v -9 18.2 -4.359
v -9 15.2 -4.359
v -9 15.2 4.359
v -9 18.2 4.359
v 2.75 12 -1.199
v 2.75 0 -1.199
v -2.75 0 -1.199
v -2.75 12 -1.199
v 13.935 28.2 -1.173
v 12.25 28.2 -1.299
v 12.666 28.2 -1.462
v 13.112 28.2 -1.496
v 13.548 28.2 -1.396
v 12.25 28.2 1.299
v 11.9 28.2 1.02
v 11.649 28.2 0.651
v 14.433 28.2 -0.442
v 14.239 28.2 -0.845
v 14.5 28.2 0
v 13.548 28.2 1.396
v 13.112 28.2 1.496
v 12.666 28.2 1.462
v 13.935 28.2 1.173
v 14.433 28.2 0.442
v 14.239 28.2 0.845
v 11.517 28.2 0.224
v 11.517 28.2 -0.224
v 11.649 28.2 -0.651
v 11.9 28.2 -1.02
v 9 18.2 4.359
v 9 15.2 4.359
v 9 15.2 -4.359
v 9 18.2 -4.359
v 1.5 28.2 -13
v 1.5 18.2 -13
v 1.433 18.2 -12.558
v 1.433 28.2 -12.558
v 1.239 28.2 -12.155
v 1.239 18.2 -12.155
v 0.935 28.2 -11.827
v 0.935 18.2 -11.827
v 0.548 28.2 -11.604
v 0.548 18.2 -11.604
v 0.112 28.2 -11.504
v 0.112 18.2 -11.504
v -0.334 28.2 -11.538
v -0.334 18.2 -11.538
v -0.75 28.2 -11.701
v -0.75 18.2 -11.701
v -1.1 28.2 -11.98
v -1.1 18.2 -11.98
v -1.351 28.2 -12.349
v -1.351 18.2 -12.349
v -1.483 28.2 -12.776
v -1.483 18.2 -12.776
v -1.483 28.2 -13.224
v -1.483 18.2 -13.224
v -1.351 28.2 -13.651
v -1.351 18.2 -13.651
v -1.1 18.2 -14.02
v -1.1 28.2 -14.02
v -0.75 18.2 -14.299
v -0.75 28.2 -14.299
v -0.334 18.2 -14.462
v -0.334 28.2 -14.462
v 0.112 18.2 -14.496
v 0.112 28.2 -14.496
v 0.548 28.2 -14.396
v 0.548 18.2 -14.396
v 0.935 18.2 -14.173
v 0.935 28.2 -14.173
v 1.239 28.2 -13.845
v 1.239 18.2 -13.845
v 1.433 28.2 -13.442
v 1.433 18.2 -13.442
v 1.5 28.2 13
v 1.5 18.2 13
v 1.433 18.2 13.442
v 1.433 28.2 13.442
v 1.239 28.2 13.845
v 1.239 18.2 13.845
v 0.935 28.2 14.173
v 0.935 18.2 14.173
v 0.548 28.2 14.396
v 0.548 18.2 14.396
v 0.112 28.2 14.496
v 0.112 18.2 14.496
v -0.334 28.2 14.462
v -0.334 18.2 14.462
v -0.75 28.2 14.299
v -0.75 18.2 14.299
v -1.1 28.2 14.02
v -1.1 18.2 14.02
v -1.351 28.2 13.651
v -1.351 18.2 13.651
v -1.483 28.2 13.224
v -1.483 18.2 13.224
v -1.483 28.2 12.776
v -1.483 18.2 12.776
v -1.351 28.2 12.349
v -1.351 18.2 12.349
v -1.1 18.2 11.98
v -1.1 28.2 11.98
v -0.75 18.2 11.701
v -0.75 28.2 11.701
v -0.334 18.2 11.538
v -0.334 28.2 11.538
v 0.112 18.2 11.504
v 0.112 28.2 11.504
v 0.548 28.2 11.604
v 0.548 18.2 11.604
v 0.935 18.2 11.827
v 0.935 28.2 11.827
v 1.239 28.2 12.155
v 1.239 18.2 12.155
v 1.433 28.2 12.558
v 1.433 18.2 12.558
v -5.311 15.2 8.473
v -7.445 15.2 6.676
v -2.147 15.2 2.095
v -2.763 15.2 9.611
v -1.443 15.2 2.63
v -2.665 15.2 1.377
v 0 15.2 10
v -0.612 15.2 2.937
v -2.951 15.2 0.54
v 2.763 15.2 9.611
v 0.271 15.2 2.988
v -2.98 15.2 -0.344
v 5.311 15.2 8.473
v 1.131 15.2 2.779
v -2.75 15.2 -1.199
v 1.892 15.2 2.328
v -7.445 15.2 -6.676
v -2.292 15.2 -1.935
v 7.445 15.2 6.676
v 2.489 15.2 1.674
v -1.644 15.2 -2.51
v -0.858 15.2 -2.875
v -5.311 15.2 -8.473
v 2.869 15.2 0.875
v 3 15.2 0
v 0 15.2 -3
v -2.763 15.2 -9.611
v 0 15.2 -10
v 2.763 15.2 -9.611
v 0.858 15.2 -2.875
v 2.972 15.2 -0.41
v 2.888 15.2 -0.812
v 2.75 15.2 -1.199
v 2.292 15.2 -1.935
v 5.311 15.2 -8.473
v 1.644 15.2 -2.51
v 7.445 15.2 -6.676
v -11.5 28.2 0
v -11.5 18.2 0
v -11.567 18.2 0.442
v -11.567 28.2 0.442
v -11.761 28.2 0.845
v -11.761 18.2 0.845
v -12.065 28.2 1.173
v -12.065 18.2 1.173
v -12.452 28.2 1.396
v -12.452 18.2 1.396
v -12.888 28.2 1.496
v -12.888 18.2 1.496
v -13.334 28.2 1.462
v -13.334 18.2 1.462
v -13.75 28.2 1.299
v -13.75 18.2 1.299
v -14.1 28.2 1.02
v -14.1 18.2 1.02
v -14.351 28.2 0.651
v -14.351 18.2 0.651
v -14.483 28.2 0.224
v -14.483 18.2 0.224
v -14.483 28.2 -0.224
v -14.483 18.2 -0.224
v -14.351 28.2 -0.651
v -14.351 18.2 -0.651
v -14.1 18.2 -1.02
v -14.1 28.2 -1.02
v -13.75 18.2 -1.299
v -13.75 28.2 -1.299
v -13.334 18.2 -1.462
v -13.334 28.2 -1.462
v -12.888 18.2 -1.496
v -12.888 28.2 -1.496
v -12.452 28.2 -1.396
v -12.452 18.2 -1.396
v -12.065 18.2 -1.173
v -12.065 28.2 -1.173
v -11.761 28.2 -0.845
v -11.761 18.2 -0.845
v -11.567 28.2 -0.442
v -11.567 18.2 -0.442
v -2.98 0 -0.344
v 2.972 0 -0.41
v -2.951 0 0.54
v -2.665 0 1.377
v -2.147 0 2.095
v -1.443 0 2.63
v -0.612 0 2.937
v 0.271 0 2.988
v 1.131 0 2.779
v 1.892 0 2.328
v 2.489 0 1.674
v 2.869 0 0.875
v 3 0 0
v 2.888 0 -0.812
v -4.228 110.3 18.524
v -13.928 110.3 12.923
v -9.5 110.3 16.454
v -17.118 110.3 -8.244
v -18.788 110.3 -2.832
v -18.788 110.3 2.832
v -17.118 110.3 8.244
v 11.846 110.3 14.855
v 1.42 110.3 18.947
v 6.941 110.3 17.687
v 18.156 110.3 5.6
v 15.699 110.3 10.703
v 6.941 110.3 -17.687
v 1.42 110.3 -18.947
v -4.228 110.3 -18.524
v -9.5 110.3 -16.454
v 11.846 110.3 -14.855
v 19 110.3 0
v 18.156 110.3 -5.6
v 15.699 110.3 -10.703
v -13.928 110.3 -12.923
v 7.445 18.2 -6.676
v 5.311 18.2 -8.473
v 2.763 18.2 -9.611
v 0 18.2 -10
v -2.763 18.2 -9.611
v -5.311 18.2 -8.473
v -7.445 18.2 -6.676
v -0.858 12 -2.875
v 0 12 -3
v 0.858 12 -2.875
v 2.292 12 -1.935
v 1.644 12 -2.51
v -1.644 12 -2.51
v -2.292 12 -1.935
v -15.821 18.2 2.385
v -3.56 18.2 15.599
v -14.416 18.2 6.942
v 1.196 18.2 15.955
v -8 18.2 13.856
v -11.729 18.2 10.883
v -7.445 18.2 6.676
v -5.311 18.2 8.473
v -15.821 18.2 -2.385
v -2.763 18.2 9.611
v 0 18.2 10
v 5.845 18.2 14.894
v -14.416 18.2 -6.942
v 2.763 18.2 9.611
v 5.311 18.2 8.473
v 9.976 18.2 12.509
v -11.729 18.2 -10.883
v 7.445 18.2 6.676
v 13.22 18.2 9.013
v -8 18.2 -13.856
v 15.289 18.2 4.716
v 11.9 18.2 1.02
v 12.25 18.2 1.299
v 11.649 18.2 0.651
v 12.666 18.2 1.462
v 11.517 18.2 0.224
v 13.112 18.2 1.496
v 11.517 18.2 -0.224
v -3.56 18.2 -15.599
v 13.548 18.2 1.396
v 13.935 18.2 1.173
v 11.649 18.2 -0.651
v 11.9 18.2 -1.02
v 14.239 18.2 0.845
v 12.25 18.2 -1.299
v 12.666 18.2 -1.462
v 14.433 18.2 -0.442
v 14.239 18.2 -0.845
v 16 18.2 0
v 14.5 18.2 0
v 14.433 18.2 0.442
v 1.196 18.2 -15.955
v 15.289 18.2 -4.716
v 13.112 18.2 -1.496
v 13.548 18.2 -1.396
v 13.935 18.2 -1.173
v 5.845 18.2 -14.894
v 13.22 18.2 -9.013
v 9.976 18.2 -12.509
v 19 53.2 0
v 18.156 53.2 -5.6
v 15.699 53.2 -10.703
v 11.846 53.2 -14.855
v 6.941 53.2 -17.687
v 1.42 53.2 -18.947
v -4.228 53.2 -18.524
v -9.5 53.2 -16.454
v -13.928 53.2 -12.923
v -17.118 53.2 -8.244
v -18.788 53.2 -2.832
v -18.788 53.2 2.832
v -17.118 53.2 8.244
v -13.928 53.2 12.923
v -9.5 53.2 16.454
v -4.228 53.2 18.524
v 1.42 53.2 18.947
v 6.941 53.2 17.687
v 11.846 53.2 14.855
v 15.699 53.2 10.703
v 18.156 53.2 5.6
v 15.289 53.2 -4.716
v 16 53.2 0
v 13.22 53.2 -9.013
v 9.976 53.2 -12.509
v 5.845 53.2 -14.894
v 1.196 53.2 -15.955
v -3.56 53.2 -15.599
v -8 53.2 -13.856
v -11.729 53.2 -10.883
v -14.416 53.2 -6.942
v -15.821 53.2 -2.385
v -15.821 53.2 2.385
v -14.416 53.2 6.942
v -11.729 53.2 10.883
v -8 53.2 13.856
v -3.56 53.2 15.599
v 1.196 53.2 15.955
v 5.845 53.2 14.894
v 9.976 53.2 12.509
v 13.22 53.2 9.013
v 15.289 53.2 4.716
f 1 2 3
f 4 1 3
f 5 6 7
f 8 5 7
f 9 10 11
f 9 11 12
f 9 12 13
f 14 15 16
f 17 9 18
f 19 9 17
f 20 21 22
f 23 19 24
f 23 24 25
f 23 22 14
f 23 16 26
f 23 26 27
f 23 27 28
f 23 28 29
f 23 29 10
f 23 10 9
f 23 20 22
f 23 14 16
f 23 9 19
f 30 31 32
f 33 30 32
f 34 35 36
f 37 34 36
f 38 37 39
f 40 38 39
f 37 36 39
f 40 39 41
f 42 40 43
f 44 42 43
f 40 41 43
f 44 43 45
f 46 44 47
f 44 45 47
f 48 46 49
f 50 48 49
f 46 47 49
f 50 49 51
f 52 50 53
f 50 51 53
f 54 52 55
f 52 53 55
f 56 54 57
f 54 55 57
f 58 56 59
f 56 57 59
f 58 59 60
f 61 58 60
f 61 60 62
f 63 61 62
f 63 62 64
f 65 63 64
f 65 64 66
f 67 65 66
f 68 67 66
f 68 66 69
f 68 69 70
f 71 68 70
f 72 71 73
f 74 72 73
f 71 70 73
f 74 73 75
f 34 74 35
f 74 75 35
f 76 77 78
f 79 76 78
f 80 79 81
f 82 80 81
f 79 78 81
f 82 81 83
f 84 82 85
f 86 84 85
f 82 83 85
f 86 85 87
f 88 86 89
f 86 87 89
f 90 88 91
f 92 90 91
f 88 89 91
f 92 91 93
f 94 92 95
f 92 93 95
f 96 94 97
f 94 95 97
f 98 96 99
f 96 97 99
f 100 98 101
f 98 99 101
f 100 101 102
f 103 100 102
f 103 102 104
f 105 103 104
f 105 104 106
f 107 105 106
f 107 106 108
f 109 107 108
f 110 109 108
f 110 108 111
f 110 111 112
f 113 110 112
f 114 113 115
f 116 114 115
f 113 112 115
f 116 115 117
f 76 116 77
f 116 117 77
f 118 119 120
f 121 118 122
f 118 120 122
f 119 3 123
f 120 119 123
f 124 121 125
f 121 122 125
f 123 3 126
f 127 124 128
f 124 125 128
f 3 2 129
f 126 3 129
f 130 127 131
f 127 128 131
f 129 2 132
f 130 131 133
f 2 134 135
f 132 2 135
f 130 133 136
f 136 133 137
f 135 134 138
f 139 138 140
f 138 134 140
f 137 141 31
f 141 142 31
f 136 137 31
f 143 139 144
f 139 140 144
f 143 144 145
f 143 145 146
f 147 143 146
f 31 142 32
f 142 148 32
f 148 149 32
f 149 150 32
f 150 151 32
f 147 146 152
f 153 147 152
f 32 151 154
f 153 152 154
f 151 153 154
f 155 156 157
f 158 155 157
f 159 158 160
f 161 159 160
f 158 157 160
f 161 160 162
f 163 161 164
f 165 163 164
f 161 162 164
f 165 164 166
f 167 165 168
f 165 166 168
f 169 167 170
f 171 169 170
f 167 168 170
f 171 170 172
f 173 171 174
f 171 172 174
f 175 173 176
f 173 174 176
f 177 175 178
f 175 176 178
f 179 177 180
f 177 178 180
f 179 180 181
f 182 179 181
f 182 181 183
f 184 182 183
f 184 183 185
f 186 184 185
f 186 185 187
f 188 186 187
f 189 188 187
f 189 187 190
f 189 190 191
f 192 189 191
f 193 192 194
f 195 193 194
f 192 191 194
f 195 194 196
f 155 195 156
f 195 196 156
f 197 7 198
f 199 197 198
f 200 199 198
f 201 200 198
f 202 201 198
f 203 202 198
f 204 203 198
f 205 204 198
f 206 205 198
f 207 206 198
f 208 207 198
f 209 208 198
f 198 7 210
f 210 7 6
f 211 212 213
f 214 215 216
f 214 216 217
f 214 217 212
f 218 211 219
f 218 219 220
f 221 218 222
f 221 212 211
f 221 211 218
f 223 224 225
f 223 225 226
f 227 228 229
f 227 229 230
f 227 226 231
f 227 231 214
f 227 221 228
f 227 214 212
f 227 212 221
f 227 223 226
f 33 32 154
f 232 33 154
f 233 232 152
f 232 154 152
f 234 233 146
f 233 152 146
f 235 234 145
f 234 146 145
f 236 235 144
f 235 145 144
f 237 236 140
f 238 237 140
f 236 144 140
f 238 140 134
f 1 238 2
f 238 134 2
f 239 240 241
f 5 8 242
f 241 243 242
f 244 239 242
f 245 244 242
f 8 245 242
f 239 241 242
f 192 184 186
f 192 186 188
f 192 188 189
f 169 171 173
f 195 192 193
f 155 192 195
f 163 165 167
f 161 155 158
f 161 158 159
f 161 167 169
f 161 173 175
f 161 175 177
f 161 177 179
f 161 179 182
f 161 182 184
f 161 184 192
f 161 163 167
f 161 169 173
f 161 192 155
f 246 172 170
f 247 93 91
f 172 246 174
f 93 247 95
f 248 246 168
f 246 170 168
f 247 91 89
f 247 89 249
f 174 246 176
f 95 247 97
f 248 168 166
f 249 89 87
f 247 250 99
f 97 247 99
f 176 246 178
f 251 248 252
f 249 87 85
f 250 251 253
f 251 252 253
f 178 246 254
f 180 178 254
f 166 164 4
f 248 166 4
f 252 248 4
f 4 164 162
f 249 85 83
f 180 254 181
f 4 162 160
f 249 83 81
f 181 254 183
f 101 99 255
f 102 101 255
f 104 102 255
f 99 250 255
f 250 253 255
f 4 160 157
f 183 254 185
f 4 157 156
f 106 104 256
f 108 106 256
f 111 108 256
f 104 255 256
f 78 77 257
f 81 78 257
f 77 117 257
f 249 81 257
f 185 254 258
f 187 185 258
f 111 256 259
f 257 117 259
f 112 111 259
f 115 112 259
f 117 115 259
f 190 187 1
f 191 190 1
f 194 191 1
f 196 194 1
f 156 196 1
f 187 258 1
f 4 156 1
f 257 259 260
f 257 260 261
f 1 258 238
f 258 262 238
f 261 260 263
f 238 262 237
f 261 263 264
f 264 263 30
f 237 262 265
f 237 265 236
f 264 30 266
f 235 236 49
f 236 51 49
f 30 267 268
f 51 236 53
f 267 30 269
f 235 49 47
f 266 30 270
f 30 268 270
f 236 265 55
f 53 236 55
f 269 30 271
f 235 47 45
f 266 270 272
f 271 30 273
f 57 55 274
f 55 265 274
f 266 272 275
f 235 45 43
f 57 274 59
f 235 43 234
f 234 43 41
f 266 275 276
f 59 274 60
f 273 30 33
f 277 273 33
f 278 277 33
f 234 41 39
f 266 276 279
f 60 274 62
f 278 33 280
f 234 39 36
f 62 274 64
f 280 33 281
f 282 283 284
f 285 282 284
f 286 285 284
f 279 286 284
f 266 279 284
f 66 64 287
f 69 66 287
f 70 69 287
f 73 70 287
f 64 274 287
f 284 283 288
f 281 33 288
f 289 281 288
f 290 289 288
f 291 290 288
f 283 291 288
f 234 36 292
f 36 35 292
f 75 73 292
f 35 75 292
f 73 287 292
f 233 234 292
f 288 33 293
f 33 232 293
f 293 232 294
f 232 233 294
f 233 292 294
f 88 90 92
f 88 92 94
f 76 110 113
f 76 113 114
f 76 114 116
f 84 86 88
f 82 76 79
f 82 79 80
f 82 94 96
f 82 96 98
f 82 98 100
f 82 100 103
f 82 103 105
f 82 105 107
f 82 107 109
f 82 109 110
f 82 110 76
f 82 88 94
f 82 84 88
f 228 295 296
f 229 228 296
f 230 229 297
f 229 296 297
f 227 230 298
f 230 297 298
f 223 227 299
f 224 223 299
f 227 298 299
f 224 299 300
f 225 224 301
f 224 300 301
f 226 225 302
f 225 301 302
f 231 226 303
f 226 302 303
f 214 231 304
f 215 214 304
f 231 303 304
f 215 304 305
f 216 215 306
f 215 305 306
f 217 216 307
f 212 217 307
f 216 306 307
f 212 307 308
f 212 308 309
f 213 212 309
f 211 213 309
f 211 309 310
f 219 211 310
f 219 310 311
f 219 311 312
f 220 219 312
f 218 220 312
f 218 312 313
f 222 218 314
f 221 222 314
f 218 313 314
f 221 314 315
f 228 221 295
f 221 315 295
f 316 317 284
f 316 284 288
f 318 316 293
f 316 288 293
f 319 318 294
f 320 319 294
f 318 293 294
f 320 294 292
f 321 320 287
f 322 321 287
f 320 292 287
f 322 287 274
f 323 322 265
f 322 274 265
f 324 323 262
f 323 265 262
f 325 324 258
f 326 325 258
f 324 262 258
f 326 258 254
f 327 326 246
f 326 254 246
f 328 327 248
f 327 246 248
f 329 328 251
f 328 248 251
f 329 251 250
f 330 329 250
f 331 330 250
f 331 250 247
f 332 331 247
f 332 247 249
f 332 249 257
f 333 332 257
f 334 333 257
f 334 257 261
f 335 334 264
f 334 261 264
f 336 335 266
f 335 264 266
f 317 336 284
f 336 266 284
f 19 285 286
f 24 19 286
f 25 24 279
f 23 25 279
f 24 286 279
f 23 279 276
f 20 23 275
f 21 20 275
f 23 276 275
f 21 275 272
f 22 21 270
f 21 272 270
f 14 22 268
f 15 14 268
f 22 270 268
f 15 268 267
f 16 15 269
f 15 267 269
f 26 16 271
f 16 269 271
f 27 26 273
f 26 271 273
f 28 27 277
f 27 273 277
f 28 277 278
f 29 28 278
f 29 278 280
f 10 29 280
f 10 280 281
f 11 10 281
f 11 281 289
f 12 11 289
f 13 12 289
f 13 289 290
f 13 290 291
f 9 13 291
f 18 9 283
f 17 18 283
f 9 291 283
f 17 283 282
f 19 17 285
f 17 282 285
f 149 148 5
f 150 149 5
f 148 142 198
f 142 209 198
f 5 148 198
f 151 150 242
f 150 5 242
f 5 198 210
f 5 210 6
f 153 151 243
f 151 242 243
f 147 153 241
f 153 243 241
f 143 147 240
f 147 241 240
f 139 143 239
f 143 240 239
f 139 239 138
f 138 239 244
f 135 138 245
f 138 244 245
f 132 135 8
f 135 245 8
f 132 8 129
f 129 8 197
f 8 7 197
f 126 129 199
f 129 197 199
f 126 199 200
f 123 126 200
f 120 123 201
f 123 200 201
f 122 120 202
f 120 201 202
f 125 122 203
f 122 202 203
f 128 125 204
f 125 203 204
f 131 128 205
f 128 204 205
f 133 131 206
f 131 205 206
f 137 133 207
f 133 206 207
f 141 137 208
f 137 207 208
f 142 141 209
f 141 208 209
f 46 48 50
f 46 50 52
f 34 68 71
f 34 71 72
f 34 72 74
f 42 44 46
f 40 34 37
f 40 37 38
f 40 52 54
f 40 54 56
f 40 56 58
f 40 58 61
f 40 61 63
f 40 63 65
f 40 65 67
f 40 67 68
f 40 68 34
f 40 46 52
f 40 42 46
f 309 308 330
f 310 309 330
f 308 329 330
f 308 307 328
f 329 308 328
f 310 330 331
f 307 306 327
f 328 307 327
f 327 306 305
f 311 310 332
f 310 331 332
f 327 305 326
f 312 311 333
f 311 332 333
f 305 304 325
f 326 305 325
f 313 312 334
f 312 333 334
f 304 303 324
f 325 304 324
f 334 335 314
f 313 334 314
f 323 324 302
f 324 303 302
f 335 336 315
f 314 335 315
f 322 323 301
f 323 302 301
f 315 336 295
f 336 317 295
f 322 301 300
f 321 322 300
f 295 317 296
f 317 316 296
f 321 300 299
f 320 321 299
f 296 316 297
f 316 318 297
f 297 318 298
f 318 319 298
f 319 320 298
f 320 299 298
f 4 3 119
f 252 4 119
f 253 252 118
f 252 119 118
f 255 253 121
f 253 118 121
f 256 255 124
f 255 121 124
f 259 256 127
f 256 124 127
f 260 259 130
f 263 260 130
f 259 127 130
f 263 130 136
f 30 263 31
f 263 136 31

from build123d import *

# Parameters (mm, degrees)
BOSS_EXTRUDE1_DEPTH = 12
BOSS_EXTRUDE2_DEPTH = 3.2
BOSS_EXTRUDE3_DEPTH = 3
SKETCH6_R           = 16
BOSS_EXTRUDE4_DEPTH = 35
SKETCH7_R           = 19
BOSS_EXTRUDE5_DEPTH = 57.1
SKETCH8_R           = 1.5
CUT_EXTRUDE1_DEPTH  = 10


with BuildPart() as part:
    # Sketch2 → Boss-Extrude1 (new body)
    with BuildSketch(Plane(origin=(0, 0, 0), x_dir=(1, 0, 0), z_dir=(0, 1, 0))):
        with BuildLine():
            Line((2.75, 1.198957881), (-2.75, 1.198957881))
            ThreePointArc((-2.75, 1.198957881), (-0.612372436, -2.936835031), (3, 0))
            ThreePointArc((3, 0), (2.936835031, 0.612372436), (2.75, 1.198957881))
        make_face()
    extrude(amount=BOSS_EXTRUDE1_DEPTH)

    # Sketch3 → Boss-Extrude2 (add)
    with BuildSketch(Plane(origin=(0, 12, 0), x_dir=(1, 0, 0), z_dir=(0, 1, 0))):
        with BuildLine():
            Line((2.75, 1.198957881), (-2.75, 1.198957881))
            ThreePointArc((-2.75, 1.198957881), (-0.612372436, -2.936835031), (3, 0))
            ThreePointArc((3, 0), (2.936835031, 0.612372436), (2.75, 1.198957881))
        make_face()
        with BuildLine():
            ThreePointArc((2.75, 1.198957881), (0, 3), (-2.75, 1.198957881))
            Line((-2.75, 1.198957881), (2.75, 1.198957881))
        make_face()
        with BuildLine():
            ThreePointArc((-2.75, 1.198957881), (0, -3), (2.75, 1.198957881))
            Line((2.75, 1.198957881), (-2.75, 1.198957881))
        make_face()
    extrude(amount=BOSS_EXTRUDE2_DEPTH)

    # Sketch5 → Boss-Extrude3 (add)
    with BuildSketch(Plane(origin=(0, 15.2, 0), x_dir=(1, 0, 0), z_dir=(0, 1, 0))):
        with BuildLine():
            Line((-9, 4.358898944), (-9, -4.358898944))
            ThreePointArc((-9, -4.358898944), (0, -10), (9, -4.358898944))
            Line((9, -4.358898944), (9, 4.358898944))
            ThreePointArc((9, 4.358898944), (0, 10), (-9, 4.358898944))
        make_face()
    extrude(amount=BOSS_EXTRUDE3_DEPTH)

    # Sketch6 → Boss-Extrude4 (add)
    with BuildSketch(Plane(origin=(0, 18.2, 0), x_dir=(1, 0, 0), z_dir=(0, 1, 0))):
        Circle(SKETCH6_R)
    extrude(amount=BOSS_EXTRUDE4_DEPTH)

    # Sketch7 → Boss-Extrude5 (add)
    with BuildSketch(Plane(origin=(0, 53.2, 0), x_dir=(1, 0, 0), z_dir=(0, 1, 0))):
        Circle(SKETCH7_R)
    extrude(amount=BOSS_EXTRUDE5_DEPTH)

    # Sketch8 → Cut-Extrude1 (cut)
    with BuildSketch(Plane.XZ.offset(-18.2)):
        with Locations((0, 13)):
            Circle(SKETCH8_R)
        with Locations((13, 0)):
            Circle(SKETCH8_R)
        with Locations((0, -13)):
            Circle(SKETCH8_R)
        with Locations((-13, 0)):
            Circle(SKETCH8_R)
    extrude(amount=-CUT_EXTRUDE1_DEPTH, mode=Mode.SUBTRACT)


solid = part.part
